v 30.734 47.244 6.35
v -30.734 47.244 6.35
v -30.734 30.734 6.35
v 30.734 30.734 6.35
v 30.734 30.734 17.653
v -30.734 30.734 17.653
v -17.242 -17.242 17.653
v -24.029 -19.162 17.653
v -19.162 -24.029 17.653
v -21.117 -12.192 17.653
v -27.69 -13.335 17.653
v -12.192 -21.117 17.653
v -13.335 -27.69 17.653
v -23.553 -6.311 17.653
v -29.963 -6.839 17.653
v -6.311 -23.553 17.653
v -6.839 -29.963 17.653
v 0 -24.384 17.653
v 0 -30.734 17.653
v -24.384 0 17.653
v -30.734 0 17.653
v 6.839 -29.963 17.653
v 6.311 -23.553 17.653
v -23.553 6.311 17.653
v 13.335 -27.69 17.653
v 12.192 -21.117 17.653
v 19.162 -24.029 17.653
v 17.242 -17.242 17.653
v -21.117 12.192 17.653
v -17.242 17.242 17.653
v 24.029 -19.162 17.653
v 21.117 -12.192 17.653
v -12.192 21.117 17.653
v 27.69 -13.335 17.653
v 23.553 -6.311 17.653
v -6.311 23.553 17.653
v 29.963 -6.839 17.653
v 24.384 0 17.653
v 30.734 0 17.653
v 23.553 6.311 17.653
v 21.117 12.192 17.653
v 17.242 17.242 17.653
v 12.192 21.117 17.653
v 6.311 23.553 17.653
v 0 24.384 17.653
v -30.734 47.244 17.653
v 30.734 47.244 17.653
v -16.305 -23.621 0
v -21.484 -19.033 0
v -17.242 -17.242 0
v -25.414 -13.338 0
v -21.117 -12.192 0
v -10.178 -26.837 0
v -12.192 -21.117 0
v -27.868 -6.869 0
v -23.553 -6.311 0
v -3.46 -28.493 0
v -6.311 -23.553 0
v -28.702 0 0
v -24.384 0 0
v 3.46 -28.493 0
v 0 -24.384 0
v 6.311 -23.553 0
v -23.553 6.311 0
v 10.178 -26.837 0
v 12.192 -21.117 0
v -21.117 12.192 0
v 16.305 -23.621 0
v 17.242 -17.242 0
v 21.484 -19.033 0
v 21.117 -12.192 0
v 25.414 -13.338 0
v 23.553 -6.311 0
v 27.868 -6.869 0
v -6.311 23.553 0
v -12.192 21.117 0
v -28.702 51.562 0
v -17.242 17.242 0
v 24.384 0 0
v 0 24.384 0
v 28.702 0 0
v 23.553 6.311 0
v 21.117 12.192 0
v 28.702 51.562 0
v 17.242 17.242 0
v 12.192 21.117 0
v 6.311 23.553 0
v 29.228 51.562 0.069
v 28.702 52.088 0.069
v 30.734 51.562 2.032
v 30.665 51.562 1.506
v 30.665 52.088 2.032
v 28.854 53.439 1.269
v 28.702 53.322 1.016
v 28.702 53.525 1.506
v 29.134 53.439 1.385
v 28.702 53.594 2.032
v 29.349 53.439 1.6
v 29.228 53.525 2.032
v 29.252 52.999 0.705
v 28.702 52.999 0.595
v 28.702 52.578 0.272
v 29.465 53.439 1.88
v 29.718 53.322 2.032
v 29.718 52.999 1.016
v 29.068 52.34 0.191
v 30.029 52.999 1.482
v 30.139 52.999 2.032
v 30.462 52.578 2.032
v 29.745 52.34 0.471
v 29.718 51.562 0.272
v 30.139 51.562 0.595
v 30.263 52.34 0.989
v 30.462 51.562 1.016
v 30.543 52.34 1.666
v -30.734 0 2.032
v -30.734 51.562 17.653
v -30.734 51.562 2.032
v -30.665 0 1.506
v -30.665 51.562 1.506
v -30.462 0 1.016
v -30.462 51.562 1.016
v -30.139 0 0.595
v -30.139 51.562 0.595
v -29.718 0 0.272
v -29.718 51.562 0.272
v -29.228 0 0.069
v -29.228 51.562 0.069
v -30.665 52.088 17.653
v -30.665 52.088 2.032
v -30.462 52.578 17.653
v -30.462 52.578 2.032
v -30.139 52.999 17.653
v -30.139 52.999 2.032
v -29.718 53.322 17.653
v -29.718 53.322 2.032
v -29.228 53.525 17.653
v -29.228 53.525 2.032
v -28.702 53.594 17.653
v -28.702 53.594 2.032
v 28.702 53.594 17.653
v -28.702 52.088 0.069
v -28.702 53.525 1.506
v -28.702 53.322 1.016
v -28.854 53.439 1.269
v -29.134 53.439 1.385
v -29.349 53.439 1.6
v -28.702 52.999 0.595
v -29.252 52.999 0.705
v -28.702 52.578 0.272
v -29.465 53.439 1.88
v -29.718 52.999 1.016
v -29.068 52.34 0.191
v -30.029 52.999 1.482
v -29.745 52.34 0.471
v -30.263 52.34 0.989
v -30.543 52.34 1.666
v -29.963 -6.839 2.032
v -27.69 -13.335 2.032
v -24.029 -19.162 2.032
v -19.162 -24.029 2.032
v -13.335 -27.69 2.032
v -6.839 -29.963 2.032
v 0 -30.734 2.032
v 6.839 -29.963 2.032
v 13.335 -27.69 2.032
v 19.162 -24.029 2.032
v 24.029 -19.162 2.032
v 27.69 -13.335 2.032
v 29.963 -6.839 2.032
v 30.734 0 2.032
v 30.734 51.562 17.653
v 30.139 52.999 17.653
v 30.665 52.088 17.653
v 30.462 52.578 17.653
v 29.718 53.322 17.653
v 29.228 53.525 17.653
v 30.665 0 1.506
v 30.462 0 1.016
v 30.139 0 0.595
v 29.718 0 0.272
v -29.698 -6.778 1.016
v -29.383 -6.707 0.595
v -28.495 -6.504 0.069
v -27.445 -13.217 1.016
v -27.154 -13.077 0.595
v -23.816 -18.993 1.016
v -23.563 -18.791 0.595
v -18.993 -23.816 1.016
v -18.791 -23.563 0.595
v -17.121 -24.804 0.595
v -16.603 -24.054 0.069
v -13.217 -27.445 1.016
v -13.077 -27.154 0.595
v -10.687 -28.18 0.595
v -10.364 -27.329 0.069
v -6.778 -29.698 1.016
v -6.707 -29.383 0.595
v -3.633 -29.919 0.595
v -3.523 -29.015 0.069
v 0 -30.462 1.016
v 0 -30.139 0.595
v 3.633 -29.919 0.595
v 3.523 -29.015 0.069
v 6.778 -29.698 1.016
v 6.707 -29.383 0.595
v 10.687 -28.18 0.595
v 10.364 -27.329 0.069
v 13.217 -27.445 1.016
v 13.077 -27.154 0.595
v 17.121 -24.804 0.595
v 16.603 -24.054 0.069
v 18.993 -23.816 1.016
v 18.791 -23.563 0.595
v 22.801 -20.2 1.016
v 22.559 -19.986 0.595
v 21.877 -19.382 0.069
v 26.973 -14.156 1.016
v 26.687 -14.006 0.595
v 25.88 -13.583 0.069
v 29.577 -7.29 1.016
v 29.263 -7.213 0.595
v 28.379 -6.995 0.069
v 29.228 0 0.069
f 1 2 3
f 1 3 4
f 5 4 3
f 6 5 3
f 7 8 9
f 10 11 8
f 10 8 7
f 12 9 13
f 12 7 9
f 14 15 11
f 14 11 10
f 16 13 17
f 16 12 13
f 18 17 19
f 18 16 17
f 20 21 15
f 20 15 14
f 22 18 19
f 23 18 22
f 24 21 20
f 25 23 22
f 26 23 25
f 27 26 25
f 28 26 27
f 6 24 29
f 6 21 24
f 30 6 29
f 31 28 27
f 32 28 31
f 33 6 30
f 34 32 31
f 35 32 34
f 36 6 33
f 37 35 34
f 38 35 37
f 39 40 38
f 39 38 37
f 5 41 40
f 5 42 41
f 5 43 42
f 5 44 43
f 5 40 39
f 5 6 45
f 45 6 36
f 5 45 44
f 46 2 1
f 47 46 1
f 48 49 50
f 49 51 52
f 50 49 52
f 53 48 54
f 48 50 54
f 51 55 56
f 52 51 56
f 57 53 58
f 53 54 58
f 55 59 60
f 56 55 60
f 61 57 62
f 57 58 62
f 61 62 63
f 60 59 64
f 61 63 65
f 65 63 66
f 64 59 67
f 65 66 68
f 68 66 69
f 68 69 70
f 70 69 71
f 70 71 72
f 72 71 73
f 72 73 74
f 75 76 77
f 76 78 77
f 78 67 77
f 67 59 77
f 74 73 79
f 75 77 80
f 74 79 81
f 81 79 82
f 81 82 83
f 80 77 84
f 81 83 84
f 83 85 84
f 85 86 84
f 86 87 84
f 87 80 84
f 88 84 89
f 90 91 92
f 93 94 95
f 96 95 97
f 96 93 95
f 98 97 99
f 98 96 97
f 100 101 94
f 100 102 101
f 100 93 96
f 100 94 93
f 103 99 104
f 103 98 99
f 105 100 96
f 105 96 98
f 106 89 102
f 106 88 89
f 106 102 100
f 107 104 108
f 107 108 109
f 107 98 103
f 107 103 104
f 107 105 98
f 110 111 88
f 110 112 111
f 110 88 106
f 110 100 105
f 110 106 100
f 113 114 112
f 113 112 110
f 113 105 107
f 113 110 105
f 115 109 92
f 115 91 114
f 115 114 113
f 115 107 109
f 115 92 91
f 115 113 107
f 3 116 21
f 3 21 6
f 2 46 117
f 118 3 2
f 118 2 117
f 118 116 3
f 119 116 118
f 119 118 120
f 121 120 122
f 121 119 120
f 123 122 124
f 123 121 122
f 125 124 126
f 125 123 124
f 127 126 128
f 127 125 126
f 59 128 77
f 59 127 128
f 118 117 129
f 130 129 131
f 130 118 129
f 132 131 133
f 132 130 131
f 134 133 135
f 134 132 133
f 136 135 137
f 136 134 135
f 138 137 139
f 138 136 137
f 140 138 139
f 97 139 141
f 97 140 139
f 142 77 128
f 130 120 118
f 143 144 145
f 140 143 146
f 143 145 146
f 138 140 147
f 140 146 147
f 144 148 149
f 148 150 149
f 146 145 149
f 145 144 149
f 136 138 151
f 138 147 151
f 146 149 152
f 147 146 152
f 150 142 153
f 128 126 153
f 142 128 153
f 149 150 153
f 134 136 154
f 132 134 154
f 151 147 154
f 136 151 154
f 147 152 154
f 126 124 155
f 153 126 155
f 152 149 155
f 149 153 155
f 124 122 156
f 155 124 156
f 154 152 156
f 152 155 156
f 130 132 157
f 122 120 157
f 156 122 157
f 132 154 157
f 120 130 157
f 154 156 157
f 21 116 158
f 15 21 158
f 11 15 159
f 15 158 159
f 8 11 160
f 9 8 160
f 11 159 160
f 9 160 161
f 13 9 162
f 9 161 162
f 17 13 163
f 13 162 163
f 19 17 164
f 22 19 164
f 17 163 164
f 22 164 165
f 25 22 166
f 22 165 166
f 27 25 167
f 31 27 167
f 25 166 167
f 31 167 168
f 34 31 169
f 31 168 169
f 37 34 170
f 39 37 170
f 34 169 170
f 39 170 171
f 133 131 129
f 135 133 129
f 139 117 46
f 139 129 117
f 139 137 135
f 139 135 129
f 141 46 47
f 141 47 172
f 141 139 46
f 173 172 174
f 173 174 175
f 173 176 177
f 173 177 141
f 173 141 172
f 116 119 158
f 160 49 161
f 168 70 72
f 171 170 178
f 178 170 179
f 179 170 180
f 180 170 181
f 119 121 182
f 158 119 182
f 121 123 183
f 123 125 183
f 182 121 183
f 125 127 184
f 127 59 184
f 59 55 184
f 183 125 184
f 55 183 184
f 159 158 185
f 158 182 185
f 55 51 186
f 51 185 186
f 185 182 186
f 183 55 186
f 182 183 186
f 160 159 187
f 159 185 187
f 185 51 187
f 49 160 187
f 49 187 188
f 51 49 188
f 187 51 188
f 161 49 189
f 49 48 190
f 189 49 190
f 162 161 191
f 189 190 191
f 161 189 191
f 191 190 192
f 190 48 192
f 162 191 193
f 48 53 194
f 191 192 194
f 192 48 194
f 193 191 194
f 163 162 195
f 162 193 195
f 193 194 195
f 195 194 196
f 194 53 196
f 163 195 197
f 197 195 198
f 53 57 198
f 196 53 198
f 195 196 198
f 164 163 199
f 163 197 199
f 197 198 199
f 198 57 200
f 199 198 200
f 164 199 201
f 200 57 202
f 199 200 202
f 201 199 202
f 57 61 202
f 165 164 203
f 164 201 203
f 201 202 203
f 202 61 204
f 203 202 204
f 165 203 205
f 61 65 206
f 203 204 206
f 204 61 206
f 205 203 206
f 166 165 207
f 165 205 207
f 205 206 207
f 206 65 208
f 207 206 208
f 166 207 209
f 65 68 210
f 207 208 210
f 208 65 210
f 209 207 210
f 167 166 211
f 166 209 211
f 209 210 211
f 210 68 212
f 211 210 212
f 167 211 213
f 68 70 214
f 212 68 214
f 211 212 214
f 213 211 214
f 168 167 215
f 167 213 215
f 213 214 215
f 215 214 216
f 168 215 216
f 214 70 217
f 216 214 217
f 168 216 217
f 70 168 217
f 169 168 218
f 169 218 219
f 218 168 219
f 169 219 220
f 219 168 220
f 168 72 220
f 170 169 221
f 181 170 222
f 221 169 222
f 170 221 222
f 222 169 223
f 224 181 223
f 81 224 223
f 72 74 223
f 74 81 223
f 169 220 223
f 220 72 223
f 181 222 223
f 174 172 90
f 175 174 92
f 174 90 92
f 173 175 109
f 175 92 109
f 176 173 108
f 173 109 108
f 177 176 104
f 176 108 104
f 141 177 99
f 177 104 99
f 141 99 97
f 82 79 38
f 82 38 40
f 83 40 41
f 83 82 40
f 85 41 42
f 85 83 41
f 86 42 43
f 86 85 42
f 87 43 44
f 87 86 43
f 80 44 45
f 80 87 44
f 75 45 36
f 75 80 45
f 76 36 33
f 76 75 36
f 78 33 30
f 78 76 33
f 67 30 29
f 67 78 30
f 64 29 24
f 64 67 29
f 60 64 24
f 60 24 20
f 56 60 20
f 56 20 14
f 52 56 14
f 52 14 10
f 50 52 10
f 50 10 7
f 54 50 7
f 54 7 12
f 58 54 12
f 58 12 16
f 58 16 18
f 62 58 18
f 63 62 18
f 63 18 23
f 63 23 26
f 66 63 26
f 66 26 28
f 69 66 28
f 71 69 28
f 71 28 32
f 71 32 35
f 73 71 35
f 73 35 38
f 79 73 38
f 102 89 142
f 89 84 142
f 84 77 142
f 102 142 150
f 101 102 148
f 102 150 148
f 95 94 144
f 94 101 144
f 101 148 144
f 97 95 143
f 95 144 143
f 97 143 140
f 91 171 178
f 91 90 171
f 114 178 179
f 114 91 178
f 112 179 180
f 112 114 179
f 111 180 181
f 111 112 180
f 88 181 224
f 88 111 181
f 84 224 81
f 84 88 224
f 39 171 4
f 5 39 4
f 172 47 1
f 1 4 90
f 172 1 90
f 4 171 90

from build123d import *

# Parameters (mm, degrees)
F0_R     = 24.384
F1_DEPTH = 6.35
F2_W     = 61.468
F2_H     = 6.35
F2_R     = 24.384
F3_DEPTH = 11.303
F4_R     = 2.032


with BuildPart() as f1:
    # F0 (on Top) → F1 (new body)
    with BuildSketch(Plane.XY):
        with BuildLine():
            Line((-30.734, 53.594), (-30.734, 0))
            ThreePointArc((-30.734, 0), (0, -30.734), (30.734, 0))
            Line((30.734, 0), (30.734, 53.594))
            Line((30.734, 53.594), (-30.734, 53.594))
        make_face()
        Circle(F0_R, mode=Mode.SUBTRACT)
    extrude(amount=F1_DEPTH)

    # F2 (on face) → F3 (join)
    with BuildSketch(Plane.XY.offset(6.35)):
        with Locations((0, 50.419)):
            Rectangle(F2_W, F2_H)
        with BuildLine():
            Line((30.734, 30.734), (-30.734, 30.734))
            Line((-30.734, 30.734), (-30.734, 0))
            ThreePointArc((-30.734, 0), (0, -30.734), (30.734, 0))
            Line((30.734, 0), (30.734, 30.734))
        make_face()
        Circle(F2_R, mode=Mode.SUBTRACT)
    extrude(amount=F3_DEPTH)

    # F4
    f4_edges = [f1.edges().sort_by_distance(p)[0] for p in [
        (0, -30.734, 0),
        (0, 53.594, 0),
        (30.734, 53.594, 8.8265),
        (-30.734, 53.594, 8.8265),
    ]]
    fillet(f4_edges, radius=F4_R)


solid = f1.part
